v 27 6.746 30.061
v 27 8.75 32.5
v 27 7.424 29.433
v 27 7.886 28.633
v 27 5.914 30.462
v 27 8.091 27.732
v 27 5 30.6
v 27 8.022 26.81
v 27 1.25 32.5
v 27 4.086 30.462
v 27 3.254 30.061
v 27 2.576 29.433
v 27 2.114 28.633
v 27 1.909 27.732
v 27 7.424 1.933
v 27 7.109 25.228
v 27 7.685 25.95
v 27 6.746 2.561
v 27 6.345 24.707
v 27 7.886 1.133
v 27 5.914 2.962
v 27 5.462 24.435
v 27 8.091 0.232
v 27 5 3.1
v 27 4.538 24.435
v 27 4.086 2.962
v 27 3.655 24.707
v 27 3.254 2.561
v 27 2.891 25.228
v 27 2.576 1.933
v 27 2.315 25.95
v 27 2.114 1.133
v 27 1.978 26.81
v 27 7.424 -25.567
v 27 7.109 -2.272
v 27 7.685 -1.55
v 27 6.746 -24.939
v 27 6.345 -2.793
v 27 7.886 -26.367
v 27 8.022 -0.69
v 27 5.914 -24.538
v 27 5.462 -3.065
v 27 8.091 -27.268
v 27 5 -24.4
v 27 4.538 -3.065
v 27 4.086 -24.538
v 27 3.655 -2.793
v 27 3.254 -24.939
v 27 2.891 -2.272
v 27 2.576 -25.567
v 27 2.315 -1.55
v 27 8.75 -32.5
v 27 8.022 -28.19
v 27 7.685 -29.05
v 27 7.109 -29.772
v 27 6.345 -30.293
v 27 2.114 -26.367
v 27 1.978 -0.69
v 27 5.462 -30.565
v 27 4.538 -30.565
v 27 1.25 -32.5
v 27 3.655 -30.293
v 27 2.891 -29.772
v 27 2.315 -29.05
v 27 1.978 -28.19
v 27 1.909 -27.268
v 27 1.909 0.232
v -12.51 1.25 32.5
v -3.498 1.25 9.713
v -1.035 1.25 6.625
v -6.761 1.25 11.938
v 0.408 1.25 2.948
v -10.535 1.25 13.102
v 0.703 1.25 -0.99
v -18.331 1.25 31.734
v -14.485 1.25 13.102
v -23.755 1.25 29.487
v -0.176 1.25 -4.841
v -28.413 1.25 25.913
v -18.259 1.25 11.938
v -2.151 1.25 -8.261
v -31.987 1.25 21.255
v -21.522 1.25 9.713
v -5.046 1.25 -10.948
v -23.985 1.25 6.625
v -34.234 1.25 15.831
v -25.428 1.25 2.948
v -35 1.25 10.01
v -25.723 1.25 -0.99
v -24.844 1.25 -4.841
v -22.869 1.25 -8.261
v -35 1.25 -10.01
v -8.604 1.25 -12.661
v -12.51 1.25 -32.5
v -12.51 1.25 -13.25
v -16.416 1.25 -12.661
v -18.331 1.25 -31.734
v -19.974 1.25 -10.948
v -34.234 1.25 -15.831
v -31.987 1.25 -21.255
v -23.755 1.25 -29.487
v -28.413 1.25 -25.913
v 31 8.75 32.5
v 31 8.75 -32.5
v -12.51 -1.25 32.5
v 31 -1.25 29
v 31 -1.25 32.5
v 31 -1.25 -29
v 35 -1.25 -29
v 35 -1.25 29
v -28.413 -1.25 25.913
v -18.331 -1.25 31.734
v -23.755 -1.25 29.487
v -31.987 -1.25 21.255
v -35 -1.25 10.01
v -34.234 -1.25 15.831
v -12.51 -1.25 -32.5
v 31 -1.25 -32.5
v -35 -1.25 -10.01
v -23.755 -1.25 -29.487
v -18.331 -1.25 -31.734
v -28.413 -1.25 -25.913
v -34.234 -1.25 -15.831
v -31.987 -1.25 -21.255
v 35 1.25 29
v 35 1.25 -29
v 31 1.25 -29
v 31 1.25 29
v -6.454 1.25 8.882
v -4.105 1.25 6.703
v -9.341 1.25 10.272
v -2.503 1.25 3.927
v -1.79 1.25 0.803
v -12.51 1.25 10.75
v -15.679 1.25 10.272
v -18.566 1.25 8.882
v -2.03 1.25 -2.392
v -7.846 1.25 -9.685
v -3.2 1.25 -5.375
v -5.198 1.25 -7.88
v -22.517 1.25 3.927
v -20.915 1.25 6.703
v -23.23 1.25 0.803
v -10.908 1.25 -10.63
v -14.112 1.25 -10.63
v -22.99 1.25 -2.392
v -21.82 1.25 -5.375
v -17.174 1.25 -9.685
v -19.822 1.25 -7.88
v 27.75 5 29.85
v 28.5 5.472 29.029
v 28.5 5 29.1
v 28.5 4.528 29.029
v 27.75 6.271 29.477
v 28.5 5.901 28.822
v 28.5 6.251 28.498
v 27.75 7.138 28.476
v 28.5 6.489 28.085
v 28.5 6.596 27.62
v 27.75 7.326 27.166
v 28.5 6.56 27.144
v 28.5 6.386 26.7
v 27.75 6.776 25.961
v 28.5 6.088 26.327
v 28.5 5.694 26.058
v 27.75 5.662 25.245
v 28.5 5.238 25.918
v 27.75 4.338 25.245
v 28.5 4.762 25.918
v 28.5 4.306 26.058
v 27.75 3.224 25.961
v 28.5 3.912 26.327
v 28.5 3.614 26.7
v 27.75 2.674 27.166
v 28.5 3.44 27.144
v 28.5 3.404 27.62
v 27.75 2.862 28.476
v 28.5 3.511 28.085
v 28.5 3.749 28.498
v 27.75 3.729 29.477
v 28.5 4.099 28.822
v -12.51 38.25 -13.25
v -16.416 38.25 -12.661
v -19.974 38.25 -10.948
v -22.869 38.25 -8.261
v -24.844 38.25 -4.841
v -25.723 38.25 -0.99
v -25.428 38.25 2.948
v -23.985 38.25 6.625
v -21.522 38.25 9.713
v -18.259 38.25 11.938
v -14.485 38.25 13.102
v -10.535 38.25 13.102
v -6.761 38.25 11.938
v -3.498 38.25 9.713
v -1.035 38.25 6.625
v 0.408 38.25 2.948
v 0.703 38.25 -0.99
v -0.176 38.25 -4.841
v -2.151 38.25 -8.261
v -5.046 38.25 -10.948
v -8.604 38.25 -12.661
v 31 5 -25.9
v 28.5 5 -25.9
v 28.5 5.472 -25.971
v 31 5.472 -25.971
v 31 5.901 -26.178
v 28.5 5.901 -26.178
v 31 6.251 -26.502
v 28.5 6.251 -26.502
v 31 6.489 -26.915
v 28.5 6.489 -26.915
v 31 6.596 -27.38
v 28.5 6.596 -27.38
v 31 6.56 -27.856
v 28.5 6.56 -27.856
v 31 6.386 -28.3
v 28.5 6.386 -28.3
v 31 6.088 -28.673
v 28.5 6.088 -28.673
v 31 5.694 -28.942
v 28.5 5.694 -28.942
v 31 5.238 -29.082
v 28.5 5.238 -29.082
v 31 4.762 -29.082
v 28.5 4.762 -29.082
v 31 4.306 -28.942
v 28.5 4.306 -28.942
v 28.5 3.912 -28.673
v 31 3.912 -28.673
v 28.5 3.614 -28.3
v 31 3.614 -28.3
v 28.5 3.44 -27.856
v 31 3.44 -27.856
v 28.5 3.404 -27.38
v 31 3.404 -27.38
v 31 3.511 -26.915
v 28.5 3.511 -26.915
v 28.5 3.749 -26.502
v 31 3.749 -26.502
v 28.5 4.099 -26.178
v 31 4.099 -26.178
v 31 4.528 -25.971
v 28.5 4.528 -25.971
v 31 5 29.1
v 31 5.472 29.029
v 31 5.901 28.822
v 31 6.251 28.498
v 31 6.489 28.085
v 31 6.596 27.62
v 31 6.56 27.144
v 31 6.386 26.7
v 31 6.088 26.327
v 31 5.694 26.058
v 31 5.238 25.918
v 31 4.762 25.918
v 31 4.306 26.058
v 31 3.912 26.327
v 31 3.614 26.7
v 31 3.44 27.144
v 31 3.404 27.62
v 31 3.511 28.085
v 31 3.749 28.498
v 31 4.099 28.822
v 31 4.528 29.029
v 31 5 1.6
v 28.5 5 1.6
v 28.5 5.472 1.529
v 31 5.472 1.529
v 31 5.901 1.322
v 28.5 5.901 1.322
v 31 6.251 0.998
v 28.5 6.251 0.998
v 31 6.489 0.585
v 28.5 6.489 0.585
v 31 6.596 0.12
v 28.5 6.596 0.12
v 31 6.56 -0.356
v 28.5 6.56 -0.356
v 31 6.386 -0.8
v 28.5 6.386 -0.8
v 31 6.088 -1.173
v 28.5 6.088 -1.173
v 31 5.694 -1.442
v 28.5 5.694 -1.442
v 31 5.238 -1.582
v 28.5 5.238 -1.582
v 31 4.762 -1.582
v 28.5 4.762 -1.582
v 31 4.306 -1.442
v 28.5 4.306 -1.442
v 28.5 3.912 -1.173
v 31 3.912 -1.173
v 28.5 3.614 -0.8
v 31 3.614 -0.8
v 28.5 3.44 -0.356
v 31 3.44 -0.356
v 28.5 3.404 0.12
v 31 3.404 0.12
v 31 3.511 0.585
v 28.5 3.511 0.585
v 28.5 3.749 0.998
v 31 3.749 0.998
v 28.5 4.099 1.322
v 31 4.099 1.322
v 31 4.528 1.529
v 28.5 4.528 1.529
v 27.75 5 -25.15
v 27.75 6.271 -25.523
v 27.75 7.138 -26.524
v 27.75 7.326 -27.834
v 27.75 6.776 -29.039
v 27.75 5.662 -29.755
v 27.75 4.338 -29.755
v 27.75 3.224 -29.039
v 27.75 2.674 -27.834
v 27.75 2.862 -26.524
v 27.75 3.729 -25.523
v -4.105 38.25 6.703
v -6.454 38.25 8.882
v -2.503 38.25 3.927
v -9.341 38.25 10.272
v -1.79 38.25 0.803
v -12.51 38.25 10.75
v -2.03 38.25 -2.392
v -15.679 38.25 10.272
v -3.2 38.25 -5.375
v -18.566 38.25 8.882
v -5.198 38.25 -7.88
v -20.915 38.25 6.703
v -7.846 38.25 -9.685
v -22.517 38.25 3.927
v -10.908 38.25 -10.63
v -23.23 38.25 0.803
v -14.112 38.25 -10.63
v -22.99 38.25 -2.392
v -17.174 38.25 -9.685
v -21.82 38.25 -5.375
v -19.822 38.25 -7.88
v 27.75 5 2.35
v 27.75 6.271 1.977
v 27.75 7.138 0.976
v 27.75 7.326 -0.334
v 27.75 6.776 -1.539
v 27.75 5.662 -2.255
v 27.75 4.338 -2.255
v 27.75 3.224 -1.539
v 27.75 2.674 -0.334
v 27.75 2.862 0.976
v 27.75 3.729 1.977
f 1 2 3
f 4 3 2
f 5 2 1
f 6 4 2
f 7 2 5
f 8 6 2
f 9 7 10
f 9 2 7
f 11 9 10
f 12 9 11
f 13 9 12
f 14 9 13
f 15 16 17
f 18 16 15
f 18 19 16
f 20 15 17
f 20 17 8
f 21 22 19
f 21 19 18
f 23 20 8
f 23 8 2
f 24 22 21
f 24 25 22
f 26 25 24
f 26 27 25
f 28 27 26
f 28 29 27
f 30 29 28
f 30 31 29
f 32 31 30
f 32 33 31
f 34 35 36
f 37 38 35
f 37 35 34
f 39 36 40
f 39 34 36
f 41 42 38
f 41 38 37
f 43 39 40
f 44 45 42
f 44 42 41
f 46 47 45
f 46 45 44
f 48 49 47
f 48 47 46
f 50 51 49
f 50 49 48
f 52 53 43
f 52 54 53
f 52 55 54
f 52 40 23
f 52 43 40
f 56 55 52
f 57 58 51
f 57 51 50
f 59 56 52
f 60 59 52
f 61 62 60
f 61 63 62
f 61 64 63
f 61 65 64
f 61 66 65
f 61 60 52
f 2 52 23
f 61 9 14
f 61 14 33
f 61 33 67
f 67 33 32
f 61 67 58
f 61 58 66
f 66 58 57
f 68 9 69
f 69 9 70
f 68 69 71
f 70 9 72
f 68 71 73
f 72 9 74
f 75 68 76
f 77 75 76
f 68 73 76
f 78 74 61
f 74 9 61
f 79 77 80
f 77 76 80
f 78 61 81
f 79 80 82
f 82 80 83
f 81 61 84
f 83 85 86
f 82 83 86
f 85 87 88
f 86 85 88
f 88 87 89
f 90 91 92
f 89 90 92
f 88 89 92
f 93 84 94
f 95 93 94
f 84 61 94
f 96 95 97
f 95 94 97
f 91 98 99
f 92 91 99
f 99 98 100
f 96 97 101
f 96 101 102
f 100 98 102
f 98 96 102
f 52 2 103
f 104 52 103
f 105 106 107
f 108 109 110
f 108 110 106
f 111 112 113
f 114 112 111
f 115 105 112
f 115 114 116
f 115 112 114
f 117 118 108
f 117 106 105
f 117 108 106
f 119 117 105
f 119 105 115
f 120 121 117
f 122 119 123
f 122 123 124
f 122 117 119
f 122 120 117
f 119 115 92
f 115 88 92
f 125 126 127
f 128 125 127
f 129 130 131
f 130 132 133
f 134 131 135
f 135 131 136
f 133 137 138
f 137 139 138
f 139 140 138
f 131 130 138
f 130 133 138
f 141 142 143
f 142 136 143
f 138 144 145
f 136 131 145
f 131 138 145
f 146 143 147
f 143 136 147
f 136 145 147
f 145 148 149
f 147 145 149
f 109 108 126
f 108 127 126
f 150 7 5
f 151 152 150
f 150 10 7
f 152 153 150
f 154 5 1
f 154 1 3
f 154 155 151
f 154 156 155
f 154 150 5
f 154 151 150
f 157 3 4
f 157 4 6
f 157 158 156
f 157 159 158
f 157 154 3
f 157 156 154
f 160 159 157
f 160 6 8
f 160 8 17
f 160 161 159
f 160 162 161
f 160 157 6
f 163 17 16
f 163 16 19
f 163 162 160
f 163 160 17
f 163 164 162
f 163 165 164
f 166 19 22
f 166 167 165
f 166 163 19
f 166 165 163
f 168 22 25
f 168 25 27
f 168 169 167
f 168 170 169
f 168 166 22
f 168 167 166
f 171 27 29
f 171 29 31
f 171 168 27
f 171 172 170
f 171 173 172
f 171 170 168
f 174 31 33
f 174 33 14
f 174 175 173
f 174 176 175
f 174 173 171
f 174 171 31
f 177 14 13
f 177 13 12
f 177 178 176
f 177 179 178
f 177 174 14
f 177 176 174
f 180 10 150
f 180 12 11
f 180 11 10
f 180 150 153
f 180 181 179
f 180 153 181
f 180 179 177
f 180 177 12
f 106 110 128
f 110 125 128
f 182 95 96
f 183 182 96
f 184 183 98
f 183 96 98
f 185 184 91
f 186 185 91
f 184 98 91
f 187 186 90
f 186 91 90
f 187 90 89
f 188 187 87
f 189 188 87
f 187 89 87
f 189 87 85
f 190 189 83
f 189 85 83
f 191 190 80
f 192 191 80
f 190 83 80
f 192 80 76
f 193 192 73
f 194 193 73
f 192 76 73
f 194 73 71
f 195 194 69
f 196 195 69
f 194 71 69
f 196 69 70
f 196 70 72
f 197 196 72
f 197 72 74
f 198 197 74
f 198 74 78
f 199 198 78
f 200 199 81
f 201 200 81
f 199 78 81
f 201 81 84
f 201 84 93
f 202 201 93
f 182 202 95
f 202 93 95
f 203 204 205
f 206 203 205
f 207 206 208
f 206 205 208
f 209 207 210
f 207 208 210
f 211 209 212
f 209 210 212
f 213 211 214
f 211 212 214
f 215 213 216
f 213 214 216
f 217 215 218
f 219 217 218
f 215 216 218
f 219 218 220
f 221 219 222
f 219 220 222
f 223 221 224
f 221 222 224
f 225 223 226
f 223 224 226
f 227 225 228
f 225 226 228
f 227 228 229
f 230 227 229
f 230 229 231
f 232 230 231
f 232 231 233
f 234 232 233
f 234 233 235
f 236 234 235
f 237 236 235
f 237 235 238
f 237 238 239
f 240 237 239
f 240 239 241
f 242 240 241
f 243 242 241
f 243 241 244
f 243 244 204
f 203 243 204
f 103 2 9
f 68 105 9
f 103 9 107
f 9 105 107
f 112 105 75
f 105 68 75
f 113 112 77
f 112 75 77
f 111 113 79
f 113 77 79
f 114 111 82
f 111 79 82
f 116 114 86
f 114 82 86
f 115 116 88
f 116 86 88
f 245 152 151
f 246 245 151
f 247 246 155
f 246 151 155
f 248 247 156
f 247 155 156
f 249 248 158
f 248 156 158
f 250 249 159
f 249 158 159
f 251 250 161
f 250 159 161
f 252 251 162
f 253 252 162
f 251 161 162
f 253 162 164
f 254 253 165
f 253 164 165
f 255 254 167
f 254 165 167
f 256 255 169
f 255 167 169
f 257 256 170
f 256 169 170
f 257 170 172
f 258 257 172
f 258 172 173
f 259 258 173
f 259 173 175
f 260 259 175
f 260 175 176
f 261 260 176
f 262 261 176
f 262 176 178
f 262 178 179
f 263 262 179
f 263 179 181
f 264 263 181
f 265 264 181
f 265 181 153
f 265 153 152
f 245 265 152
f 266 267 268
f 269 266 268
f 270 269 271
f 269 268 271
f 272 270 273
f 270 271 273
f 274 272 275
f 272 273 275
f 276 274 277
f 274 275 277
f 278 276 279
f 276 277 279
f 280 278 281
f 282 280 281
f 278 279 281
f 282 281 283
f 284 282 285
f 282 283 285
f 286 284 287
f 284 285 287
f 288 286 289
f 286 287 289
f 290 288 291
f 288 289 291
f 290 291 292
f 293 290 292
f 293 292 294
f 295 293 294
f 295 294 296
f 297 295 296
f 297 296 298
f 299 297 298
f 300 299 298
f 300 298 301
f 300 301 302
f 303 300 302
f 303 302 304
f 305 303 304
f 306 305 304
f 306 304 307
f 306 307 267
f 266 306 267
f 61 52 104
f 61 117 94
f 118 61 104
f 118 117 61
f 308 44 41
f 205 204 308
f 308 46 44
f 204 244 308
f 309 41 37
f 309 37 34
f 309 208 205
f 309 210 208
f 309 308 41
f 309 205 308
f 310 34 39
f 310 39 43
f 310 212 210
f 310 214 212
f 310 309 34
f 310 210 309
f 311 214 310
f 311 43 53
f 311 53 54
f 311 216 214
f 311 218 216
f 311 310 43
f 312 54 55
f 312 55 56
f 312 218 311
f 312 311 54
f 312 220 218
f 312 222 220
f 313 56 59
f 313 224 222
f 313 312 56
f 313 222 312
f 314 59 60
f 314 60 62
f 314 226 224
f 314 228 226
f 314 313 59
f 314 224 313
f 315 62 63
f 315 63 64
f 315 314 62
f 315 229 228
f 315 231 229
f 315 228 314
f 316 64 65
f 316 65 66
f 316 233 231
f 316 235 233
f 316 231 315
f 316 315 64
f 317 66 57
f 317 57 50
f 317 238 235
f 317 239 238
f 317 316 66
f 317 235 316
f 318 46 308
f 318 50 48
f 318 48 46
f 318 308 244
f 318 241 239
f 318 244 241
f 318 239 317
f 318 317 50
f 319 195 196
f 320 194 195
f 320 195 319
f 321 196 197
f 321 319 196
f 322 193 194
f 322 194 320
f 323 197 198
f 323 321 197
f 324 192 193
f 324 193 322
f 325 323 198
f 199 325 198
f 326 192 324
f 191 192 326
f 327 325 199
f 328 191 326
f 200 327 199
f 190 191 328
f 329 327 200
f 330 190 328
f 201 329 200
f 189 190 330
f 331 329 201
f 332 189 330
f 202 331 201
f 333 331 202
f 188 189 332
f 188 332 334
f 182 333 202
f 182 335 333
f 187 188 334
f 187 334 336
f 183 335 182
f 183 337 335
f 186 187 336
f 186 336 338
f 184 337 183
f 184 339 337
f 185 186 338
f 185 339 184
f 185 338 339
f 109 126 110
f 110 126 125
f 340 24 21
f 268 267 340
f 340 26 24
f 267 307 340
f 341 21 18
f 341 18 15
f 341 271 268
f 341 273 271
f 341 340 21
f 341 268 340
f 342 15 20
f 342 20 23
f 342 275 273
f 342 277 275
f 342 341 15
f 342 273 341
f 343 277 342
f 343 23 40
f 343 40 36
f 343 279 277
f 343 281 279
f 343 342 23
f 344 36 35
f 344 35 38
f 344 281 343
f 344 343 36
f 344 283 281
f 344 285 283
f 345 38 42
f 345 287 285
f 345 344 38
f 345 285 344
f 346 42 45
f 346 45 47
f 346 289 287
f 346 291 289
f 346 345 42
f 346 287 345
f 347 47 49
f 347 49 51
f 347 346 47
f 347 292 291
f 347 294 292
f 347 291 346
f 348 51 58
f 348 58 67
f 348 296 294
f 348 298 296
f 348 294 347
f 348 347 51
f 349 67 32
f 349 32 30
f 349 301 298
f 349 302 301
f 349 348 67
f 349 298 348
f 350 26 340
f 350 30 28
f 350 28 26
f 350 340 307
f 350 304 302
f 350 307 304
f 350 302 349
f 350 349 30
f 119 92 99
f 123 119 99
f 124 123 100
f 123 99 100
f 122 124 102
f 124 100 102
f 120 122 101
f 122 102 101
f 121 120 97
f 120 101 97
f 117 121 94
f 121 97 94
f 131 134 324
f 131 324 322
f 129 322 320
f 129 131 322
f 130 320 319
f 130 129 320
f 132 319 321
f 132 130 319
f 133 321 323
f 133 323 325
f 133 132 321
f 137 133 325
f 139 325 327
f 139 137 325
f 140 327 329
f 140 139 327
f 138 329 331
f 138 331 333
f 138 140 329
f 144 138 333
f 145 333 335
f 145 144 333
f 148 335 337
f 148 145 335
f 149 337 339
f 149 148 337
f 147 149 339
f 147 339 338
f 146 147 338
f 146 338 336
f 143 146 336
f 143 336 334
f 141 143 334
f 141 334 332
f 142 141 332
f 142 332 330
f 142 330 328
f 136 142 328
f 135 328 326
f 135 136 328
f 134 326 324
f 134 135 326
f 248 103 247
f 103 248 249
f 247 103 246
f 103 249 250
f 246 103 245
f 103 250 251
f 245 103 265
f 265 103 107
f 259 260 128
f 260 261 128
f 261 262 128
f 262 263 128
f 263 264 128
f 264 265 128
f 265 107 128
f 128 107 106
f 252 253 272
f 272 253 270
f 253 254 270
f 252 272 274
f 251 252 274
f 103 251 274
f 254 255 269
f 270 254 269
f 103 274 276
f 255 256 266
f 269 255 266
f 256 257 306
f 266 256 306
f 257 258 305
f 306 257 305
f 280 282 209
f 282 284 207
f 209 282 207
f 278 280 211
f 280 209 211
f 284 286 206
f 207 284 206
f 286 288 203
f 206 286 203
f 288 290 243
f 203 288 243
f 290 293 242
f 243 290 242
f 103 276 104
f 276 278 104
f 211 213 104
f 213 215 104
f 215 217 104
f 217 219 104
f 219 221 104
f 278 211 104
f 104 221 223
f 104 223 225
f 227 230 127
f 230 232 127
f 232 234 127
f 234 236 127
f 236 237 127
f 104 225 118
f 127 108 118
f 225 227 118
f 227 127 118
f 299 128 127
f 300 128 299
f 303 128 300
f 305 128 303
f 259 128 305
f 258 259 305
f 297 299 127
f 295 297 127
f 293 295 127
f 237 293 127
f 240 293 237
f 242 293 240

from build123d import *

# Parameters (mm, degrees)
BOSS_EXTRUDE1_DEPTH = 1.25
SKETCH3_R           = 13.25
SKETCH3_R_2         = 10.75
BOSS_EXTRUDE2_DEPTH = 37
SKETCH4_W           = 4
SKETCH4_H           = 65
BOSS_EXTRUDE3_DEPTH = 7.5
SKETCH5_R           = 1.6
CUT_EXTRUDE1_DEPTH  = 7.5
CHAMFER1_SIZE       = 1.5


with BuildPart() as part:
    # Sketch1 → Boss-Extrude1 (new, symmetric)
    with BuildSketch(Plane(origin=(0, 0, 0), x_dir=(1, 0, 0), z_dir=(0, 1, 0))):
        with BuildLine():
            Line((31, 32.5), (31, 29))
            Line((31, 29), (35, 29))
            Line((35, 29), (35, -29))
            Line((35, -29), (31, -29))
            Line((31, -29), (31, -32.5))
            Line((31, -32.5), (-12.51, -32.5))
            ThreePointArc((-12.51, -32.5), (-28.412831509, -25.912831509), (-35, -10.01))
            Line((-35, -10.01), (-35, 10.01))
            ThreePointArc((-35, 10.01), (-28.412831509, 25.912831509), (-12.51, 32.5))
            Line((-12.51, 32.5), (31, 32.5))
        make_face()
    extrude(amount=BOSS_EXTRUDE1_DEPTH, both=True)

    # Sketch3 → Boss-Extrude2 (add)
    with BuildSketch(Plane(origin=(0, 1.25, 0), x_dir=(1, 0, 0), z_dir=(0, 1, 0))):
        with Locations(Location((-12.51, 0, 0), (0, 0, 90))):
            Circle(SKETCH3_R)
        with Locations(Location((-12.51, 0, 0), (0, 0, 270))):
            Circle(SKETCH3_R_2, mode=Mode.SUBTRACT)
    extrude(amount=BOSS_EXTRUDE2_DEPTH)

    # Sketch4 → Boss-Extrude3 (add)
    with BuildSketch(Plane(origin=(0, 1.25, 0), x_dir=(1, 0, 0), z_dir=(0, 1, 0))):
        with Locations((29, 0)):
            Rectangle(SKETCH4_W, SKETCH4_H)
    extrude(amount=BOSS_EXTRUDE3_DEPTH)

    # Sketch5 → Cut-Extrude1 (cut)
    with BuildSketch(Plane.ZY.offset(-27)):
        with Locations((-27.5, 5)):
            Circle(SKETCH5_R)
        with Locations((0, 5)):
            Circle(SKETCH5_R)
        with Locations((27.5, 5)):
            Circle(SKETCH5_R)
    extrude(amount=-CUT_EXTRUDE1_DEPTH, mode=Mode.SUBTRACT)

    # Chamfer1
    chamfer1_edges = [part.edges().sort_by_distance(p)[0] for p in [
        (27, 5, -29.1),
        (27, 5, -1.6),
        (27, 5, 25.9),
    ]]
    chamfer(chamfer1_edges, length=CHAMFER1_SIZE)


solid = part.part
